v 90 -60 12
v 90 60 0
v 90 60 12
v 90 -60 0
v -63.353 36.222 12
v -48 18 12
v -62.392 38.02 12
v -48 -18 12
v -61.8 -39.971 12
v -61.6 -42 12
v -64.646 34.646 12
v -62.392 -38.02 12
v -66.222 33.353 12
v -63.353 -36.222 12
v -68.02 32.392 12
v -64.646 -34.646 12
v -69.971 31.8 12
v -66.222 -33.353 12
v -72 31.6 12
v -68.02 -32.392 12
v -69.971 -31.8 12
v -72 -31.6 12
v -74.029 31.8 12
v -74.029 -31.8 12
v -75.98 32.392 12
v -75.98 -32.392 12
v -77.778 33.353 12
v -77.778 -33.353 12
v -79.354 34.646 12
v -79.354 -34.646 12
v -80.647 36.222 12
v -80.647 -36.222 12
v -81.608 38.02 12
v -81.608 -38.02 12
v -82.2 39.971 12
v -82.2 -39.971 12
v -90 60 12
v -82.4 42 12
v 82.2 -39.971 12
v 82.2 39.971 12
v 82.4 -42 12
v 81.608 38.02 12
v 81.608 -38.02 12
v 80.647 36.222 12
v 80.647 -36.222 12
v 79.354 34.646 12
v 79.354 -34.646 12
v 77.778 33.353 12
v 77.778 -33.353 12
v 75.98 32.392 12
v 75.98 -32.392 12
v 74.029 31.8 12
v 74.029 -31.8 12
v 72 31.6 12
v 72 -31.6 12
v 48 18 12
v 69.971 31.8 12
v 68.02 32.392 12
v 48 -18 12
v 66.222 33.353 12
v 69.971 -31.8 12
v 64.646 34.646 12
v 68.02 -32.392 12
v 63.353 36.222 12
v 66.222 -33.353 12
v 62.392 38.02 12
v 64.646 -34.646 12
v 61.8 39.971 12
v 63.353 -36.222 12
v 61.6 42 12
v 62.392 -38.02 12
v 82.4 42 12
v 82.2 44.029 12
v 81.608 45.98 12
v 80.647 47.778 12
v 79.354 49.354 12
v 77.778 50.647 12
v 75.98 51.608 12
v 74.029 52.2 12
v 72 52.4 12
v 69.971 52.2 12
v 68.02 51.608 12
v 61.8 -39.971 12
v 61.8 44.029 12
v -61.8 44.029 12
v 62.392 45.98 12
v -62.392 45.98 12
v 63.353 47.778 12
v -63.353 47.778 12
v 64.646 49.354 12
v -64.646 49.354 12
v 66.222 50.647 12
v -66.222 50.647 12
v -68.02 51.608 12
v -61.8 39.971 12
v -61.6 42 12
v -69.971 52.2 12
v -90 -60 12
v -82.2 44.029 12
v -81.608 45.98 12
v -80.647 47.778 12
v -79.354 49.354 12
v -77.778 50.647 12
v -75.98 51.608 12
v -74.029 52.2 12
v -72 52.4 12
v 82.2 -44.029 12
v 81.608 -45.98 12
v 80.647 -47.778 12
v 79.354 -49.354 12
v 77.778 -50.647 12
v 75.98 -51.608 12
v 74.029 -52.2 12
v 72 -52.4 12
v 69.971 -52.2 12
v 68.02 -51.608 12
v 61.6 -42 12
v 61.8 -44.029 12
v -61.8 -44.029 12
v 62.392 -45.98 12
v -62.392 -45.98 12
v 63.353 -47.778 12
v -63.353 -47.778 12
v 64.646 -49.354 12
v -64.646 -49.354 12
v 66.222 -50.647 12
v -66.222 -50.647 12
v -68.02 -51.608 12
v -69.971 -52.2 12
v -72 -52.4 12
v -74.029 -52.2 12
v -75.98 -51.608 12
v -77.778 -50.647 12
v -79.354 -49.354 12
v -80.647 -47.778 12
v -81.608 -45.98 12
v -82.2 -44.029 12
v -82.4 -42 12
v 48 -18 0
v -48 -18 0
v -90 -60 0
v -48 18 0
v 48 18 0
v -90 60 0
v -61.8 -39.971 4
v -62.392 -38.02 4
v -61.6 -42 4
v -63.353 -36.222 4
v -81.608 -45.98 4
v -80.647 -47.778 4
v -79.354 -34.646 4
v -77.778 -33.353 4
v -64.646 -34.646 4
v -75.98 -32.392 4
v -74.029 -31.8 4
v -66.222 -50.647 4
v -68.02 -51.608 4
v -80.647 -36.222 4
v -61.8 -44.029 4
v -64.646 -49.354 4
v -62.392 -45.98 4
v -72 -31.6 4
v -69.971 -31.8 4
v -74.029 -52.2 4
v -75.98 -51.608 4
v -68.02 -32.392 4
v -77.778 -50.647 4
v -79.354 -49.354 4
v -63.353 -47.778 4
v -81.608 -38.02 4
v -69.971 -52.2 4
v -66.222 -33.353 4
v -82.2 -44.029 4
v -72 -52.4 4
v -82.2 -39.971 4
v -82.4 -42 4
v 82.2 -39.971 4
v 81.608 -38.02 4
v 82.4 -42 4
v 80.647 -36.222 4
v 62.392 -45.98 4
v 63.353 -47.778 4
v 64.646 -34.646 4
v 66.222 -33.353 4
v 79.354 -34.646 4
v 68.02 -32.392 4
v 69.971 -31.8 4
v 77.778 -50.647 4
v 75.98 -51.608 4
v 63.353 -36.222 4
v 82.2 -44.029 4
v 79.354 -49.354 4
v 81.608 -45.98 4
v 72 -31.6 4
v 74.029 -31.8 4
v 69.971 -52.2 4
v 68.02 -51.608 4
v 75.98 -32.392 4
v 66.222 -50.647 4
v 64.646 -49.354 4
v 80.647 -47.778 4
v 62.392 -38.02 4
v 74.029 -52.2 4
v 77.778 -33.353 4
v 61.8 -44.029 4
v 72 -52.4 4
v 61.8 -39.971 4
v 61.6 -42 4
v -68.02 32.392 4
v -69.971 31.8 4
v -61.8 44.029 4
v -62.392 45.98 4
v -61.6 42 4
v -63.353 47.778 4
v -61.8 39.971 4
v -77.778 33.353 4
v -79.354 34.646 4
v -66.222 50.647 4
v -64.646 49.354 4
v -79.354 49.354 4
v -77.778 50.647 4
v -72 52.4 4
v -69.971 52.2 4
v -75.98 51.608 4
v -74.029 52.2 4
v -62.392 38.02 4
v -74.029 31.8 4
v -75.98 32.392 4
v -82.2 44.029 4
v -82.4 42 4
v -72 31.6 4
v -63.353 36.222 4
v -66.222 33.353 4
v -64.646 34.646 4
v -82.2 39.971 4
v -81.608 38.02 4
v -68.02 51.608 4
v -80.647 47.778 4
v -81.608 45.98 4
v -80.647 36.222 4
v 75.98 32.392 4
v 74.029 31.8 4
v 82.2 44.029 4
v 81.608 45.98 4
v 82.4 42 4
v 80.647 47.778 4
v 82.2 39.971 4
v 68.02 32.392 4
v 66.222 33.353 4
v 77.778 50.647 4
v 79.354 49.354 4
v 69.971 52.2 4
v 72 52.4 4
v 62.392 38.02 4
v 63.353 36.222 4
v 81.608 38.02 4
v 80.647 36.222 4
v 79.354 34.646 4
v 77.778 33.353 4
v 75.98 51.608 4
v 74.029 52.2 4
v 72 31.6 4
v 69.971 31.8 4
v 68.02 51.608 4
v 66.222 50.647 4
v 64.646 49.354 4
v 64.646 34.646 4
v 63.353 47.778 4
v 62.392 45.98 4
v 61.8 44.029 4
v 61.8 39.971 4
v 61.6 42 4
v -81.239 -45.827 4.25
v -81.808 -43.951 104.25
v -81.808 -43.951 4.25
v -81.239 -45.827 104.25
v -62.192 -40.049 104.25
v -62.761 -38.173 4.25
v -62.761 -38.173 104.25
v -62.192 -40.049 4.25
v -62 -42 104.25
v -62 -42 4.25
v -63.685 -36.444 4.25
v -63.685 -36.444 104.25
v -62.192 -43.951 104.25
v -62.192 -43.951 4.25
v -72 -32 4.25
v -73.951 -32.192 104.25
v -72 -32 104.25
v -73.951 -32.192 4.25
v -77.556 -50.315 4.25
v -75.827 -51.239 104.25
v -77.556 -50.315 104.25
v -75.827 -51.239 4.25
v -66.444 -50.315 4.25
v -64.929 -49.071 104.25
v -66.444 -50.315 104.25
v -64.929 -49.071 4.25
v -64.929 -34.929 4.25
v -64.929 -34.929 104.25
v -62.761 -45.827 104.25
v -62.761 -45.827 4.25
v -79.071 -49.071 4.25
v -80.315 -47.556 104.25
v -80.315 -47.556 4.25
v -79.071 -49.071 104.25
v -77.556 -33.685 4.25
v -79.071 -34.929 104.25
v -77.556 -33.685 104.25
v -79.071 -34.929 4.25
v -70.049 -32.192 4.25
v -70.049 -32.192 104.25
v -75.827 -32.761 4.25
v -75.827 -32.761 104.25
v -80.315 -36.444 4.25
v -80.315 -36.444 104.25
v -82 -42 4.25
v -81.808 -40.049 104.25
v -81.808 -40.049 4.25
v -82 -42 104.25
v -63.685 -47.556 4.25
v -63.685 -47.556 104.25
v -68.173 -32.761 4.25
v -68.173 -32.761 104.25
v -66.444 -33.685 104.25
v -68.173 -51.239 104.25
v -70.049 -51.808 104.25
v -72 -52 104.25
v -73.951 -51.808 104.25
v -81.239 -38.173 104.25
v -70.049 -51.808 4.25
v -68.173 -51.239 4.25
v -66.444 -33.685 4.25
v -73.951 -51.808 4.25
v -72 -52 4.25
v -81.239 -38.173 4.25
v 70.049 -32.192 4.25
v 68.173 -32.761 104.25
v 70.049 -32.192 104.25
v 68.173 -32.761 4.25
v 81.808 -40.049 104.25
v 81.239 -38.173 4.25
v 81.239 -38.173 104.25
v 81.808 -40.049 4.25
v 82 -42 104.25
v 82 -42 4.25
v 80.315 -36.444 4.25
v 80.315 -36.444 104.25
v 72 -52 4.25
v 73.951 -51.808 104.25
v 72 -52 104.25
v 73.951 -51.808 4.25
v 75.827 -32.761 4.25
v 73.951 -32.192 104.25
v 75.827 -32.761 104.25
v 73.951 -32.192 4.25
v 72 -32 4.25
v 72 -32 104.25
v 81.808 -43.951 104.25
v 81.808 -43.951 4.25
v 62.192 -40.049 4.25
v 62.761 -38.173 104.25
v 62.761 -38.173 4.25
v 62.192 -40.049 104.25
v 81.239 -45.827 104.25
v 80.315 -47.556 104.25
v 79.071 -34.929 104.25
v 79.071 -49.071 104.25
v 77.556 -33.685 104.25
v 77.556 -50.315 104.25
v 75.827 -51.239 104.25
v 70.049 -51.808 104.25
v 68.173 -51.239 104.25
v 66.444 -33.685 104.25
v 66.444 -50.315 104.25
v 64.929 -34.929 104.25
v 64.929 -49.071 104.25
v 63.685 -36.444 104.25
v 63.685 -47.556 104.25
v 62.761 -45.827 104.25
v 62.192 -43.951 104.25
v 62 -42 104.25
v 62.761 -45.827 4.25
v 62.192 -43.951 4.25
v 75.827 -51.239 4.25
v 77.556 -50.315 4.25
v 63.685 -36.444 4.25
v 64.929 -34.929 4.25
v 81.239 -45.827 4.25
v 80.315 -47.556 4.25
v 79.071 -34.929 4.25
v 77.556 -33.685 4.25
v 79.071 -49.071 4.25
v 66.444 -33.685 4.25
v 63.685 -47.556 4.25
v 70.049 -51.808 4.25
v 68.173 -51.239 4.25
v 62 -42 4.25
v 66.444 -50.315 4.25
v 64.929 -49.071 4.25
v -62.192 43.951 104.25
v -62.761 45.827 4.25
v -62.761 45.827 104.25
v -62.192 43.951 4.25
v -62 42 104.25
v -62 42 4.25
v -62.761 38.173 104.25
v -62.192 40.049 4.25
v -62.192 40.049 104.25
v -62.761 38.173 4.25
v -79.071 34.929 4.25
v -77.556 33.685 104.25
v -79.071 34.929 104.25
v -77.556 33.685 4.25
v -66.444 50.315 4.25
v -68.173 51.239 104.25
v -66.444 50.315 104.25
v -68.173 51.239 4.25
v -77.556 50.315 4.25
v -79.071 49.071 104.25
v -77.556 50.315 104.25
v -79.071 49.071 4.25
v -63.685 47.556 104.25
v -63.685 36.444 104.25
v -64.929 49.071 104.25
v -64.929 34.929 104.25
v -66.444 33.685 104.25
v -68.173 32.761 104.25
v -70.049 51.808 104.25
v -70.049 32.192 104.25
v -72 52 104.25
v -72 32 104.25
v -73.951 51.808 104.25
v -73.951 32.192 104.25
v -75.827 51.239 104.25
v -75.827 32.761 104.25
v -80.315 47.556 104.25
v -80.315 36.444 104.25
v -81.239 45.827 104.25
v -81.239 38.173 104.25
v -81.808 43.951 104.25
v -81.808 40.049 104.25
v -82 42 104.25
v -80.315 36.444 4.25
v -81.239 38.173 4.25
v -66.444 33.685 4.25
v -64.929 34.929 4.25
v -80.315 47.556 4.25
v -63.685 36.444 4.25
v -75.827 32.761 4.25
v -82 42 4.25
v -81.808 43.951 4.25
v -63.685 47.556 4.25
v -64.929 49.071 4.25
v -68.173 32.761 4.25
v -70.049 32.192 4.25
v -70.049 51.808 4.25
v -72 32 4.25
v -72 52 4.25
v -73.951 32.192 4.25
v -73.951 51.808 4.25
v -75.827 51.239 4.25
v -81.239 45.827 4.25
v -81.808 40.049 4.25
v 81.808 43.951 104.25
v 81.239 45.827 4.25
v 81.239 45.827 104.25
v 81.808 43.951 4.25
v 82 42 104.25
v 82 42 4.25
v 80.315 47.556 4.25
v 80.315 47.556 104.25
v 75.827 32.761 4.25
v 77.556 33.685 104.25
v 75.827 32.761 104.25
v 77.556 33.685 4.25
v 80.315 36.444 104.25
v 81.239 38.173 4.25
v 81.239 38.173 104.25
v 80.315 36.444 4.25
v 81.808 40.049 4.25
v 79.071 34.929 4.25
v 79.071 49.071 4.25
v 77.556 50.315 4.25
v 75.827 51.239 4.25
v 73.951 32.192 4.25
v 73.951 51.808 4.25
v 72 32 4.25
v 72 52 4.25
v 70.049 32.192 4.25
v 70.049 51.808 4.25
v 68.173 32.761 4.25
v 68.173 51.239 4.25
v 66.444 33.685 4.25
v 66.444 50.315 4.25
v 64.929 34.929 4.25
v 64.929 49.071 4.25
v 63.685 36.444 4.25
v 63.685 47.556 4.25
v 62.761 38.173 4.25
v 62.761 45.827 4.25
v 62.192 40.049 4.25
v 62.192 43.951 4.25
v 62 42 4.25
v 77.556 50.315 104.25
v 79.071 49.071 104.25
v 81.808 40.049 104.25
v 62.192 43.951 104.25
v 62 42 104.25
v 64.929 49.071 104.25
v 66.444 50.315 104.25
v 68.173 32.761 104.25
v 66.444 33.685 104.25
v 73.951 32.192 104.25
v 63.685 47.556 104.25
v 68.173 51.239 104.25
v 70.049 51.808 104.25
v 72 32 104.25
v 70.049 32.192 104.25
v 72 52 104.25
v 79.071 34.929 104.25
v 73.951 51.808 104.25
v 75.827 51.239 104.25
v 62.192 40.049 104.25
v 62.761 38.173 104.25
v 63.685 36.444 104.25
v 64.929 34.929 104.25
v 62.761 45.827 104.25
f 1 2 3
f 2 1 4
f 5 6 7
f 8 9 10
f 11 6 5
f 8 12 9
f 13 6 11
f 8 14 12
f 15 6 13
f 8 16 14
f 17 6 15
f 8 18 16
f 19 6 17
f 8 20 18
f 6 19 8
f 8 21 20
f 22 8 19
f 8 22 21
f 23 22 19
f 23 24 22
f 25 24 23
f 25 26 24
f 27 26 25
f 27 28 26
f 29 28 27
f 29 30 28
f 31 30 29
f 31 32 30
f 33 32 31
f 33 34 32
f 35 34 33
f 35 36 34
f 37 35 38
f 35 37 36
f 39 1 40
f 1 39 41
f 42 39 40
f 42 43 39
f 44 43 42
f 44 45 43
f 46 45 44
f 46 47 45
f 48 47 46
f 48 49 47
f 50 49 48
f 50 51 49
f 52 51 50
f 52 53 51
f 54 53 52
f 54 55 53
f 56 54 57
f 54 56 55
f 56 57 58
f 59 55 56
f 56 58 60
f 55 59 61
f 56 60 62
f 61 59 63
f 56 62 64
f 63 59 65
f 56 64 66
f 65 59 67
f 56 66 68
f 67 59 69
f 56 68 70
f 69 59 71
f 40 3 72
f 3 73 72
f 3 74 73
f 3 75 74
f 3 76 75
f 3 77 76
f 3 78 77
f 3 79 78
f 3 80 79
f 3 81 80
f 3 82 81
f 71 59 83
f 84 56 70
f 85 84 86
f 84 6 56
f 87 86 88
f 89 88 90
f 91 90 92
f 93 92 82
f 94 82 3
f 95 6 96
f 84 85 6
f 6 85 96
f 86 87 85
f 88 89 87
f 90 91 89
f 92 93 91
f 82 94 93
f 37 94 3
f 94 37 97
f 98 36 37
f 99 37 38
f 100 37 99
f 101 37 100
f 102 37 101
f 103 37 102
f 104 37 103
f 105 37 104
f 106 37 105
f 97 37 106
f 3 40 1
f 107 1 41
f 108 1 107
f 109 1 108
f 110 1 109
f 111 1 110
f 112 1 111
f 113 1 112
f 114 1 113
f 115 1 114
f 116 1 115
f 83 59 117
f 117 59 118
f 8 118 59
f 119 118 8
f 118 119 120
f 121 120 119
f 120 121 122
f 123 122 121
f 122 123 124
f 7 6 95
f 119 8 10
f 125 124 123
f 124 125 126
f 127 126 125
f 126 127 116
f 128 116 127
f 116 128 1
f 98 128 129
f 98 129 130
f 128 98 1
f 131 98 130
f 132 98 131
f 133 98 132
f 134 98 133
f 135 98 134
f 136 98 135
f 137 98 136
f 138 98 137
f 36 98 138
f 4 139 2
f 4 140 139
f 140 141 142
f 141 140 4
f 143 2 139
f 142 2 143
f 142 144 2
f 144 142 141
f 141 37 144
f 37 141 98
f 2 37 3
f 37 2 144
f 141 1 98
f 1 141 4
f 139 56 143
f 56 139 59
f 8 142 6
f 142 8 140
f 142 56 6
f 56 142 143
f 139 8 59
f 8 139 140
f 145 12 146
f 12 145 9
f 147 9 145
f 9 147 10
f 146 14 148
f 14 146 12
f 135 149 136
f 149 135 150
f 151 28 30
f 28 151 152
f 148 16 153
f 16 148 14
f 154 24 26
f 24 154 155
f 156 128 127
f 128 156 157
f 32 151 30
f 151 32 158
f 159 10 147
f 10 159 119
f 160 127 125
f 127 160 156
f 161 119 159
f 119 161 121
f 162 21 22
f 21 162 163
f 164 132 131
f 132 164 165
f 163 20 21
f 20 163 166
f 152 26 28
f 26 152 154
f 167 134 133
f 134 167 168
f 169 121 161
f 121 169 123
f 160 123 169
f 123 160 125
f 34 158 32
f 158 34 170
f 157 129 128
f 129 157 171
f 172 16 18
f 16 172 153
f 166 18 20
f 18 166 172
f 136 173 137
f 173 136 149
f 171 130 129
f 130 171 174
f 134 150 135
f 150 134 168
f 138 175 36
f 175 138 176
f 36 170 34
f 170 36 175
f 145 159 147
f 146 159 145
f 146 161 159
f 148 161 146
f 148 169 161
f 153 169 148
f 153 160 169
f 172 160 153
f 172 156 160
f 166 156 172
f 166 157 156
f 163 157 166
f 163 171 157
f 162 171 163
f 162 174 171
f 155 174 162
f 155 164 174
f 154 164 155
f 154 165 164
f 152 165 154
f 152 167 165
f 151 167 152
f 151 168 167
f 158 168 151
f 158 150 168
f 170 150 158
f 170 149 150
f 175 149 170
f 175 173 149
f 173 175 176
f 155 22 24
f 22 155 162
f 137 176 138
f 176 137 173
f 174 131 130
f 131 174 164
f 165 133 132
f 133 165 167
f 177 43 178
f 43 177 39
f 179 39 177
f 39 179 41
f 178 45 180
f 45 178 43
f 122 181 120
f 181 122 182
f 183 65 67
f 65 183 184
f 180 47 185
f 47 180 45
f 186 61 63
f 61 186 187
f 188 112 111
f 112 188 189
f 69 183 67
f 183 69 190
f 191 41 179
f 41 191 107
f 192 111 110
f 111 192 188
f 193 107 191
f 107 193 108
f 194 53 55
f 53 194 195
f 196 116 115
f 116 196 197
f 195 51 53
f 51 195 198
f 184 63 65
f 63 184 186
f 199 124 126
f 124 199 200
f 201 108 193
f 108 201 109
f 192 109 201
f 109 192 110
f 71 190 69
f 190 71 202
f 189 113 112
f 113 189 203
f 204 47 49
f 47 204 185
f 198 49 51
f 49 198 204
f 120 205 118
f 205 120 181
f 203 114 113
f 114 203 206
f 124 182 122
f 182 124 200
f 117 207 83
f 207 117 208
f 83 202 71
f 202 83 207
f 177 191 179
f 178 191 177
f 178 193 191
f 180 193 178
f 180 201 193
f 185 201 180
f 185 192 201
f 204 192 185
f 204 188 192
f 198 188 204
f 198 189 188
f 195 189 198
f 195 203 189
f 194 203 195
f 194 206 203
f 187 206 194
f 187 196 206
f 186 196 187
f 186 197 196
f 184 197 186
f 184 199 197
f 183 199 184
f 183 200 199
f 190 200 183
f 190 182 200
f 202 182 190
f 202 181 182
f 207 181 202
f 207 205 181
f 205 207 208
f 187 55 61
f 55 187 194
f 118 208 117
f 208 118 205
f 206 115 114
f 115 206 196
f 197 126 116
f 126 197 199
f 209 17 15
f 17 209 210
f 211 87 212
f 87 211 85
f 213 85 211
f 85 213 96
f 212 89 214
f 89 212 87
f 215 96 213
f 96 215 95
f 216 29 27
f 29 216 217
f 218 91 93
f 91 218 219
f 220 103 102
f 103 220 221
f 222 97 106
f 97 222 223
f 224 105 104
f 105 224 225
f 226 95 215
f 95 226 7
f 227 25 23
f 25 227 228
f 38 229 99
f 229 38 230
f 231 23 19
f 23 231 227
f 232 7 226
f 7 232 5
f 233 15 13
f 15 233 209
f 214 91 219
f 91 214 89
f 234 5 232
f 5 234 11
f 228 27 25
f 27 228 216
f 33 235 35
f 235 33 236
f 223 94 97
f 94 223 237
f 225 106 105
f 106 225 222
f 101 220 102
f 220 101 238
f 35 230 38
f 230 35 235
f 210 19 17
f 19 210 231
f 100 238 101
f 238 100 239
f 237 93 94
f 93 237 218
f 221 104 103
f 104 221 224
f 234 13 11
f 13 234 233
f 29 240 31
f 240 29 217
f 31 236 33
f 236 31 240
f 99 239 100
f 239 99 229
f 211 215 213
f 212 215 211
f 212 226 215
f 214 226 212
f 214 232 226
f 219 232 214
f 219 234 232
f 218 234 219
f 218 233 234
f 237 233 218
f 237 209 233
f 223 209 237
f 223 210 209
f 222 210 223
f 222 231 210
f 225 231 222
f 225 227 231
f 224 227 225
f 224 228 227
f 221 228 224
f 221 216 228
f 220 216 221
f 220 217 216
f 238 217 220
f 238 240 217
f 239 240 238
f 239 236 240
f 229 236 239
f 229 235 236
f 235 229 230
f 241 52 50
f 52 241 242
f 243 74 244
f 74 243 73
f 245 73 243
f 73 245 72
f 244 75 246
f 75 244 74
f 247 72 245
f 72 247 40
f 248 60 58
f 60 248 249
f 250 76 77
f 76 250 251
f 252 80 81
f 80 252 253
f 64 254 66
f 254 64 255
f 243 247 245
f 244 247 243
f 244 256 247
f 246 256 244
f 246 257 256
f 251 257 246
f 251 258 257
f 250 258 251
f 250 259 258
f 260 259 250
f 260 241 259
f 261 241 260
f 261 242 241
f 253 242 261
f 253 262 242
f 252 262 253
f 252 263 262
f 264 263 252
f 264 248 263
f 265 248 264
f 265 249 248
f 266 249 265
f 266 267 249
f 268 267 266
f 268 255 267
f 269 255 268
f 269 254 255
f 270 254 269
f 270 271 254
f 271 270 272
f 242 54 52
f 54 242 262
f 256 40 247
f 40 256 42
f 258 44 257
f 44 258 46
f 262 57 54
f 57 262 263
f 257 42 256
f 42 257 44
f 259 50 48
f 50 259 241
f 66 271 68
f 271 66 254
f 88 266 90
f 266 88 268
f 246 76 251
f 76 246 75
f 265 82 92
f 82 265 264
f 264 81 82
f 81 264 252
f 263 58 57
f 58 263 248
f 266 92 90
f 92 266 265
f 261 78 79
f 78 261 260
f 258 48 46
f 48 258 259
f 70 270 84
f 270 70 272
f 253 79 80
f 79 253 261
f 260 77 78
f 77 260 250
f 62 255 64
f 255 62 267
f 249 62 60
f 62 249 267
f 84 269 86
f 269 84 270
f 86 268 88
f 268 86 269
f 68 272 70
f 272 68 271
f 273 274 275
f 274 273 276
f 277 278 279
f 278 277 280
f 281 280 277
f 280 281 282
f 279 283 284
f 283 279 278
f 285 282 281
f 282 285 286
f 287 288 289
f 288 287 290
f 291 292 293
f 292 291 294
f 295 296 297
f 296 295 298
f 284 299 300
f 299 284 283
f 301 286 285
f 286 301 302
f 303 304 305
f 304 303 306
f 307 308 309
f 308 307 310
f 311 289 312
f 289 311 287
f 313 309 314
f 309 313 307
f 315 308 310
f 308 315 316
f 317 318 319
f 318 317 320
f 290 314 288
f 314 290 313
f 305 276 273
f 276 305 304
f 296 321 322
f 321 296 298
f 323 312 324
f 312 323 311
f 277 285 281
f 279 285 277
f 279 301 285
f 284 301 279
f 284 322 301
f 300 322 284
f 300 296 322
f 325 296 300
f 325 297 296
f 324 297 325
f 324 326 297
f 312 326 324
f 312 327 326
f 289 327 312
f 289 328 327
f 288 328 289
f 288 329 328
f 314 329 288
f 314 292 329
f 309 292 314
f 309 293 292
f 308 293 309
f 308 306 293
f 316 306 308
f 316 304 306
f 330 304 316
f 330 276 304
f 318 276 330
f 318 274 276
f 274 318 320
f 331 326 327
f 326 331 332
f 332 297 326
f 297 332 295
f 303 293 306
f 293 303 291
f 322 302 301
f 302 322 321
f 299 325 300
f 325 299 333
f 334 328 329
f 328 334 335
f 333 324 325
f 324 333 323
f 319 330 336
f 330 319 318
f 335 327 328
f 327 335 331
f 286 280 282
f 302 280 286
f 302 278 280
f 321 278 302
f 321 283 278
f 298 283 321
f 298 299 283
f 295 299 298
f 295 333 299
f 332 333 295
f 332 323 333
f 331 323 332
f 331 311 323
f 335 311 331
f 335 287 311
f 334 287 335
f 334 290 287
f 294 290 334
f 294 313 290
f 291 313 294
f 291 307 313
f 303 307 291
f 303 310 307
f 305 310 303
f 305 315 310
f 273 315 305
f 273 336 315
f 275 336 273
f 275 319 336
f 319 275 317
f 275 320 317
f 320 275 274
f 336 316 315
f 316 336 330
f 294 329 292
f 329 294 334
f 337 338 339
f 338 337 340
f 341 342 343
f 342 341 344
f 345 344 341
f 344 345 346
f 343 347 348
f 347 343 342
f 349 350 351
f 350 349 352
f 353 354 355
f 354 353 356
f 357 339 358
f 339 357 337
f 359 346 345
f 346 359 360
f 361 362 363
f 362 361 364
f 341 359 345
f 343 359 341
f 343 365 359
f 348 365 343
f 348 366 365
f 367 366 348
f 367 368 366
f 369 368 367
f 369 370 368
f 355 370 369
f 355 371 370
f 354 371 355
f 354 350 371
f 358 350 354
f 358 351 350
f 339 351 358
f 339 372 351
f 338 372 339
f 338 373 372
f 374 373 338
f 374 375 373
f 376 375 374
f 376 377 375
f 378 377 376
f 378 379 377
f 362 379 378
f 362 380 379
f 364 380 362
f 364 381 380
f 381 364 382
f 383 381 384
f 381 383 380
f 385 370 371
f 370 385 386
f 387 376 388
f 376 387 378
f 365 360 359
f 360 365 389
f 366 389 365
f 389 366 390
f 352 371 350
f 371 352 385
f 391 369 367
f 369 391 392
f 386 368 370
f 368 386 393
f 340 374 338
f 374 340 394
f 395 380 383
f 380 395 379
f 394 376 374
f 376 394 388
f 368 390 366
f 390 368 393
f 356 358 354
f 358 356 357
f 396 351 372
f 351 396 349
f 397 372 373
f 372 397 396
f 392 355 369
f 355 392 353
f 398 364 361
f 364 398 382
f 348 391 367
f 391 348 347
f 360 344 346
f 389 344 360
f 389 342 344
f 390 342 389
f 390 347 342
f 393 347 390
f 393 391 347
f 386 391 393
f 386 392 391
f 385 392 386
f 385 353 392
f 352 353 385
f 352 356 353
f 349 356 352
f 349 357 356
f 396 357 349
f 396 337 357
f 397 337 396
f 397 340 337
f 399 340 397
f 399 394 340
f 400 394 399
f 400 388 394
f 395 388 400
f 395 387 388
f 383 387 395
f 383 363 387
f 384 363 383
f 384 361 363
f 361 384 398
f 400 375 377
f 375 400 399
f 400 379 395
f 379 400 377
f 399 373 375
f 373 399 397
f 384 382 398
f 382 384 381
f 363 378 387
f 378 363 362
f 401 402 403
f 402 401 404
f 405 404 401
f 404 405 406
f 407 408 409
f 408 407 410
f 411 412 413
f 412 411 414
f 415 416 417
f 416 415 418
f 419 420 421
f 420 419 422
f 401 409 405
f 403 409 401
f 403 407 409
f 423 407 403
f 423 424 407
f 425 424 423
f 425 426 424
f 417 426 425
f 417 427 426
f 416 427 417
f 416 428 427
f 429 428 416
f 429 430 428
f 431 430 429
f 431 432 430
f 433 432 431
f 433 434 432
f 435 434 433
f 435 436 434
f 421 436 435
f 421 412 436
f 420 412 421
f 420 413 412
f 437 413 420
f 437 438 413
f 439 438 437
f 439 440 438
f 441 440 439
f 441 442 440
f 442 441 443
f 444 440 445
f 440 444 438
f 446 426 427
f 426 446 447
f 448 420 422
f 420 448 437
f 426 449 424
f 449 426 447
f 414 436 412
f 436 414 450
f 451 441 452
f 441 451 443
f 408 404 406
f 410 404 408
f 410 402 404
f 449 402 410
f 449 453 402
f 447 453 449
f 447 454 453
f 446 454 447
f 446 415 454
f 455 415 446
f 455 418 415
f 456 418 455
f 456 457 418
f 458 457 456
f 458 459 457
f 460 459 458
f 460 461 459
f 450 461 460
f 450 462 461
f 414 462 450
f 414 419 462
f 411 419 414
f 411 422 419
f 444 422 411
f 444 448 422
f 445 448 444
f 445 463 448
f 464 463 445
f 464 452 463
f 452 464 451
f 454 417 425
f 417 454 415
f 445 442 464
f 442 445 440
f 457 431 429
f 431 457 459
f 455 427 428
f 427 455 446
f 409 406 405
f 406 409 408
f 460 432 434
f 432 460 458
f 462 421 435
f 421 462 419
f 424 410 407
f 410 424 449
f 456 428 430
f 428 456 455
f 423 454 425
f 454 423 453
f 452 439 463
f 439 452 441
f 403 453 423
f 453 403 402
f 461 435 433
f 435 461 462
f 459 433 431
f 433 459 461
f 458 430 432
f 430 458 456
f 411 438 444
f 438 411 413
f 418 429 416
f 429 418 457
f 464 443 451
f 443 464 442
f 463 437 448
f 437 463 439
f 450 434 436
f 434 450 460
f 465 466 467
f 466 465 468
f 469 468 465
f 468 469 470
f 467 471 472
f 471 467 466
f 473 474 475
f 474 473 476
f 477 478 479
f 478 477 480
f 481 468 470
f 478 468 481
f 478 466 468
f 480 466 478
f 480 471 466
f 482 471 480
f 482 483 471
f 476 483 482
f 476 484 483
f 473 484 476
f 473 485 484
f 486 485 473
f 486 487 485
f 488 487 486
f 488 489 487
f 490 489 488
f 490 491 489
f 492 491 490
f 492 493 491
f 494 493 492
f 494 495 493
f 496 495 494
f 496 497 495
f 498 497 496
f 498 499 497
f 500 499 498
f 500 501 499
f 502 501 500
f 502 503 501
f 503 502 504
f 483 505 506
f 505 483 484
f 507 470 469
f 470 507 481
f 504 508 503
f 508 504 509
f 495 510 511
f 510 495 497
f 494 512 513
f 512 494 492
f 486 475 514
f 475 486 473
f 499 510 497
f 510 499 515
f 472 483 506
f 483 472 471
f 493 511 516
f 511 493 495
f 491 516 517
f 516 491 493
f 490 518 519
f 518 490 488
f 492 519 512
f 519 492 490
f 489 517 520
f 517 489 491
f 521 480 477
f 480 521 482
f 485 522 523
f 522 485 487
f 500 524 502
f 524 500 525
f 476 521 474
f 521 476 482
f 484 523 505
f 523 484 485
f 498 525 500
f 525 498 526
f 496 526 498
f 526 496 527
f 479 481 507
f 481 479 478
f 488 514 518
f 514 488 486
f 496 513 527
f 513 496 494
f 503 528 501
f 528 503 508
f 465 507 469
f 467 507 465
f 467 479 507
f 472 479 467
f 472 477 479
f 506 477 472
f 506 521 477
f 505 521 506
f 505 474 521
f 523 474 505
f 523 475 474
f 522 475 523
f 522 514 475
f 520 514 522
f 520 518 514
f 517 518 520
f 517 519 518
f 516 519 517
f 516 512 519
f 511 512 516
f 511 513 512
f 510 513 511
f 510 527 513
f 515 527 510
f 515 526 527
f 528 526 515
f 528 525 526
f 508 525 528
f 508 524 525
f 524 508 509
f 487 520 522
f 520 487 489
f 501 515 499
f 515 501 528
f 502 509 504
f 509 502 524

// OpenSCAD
$fn = 32;

// ------------------------------------------------------------------------
// Frame with four posts: 180 x 120 mm frame, four d20 posts
// Every part is its own module, assembly() places them once.
// ------------------------------------------------------------------------

// --- part 1 ---
module base_frame() {
  difference() {
    translate([-90, -60, 0]) cube([180, 120, 12]);
    translate([-48, -18, -1]) cube([96, 36, 14]);
    translate([-72, -42, 4]) cylinder(h = 9, d = 20.8);
    translate([72, -42, 4]) cylinder(h = 9, d = 20.8);
    translate([-72, 42, 4]) cylinder(h = 9, d = 20.8);
    translate([72, 42, 4]) cylinder(h = 9, d = 20.8);
  }
}

// --- part 2 ---
module post1() {
  cylinder(h = 100, d = 20);
}

// --- part 3 ---
module post2() {
  cylinder(h = 100, d = 20);
}

// --- part 4 ---
module post3() {
  cylinder(h = 100, d = 20);
}

// --- part 5 ---
module post4() {
  cylinder(h = 100, d = 20);
}

// --- assembly ---
module assembly() {
  translate([0, 0, 0]) rotate([0, 0, 0]) base_frame();
  translate([-72, -42, 4.25]) rotate([0, 0, 0]) post1();
  translate([72, -42, 4.25]) rotate([0, 0, 0]) post2();
  translate([-72, 42, 4.25]) rotate([0, 0, 0]) post3();
  translate([72, 42, 4.25]) rotate([0, 0, 0]) post4();
}

assembly();
